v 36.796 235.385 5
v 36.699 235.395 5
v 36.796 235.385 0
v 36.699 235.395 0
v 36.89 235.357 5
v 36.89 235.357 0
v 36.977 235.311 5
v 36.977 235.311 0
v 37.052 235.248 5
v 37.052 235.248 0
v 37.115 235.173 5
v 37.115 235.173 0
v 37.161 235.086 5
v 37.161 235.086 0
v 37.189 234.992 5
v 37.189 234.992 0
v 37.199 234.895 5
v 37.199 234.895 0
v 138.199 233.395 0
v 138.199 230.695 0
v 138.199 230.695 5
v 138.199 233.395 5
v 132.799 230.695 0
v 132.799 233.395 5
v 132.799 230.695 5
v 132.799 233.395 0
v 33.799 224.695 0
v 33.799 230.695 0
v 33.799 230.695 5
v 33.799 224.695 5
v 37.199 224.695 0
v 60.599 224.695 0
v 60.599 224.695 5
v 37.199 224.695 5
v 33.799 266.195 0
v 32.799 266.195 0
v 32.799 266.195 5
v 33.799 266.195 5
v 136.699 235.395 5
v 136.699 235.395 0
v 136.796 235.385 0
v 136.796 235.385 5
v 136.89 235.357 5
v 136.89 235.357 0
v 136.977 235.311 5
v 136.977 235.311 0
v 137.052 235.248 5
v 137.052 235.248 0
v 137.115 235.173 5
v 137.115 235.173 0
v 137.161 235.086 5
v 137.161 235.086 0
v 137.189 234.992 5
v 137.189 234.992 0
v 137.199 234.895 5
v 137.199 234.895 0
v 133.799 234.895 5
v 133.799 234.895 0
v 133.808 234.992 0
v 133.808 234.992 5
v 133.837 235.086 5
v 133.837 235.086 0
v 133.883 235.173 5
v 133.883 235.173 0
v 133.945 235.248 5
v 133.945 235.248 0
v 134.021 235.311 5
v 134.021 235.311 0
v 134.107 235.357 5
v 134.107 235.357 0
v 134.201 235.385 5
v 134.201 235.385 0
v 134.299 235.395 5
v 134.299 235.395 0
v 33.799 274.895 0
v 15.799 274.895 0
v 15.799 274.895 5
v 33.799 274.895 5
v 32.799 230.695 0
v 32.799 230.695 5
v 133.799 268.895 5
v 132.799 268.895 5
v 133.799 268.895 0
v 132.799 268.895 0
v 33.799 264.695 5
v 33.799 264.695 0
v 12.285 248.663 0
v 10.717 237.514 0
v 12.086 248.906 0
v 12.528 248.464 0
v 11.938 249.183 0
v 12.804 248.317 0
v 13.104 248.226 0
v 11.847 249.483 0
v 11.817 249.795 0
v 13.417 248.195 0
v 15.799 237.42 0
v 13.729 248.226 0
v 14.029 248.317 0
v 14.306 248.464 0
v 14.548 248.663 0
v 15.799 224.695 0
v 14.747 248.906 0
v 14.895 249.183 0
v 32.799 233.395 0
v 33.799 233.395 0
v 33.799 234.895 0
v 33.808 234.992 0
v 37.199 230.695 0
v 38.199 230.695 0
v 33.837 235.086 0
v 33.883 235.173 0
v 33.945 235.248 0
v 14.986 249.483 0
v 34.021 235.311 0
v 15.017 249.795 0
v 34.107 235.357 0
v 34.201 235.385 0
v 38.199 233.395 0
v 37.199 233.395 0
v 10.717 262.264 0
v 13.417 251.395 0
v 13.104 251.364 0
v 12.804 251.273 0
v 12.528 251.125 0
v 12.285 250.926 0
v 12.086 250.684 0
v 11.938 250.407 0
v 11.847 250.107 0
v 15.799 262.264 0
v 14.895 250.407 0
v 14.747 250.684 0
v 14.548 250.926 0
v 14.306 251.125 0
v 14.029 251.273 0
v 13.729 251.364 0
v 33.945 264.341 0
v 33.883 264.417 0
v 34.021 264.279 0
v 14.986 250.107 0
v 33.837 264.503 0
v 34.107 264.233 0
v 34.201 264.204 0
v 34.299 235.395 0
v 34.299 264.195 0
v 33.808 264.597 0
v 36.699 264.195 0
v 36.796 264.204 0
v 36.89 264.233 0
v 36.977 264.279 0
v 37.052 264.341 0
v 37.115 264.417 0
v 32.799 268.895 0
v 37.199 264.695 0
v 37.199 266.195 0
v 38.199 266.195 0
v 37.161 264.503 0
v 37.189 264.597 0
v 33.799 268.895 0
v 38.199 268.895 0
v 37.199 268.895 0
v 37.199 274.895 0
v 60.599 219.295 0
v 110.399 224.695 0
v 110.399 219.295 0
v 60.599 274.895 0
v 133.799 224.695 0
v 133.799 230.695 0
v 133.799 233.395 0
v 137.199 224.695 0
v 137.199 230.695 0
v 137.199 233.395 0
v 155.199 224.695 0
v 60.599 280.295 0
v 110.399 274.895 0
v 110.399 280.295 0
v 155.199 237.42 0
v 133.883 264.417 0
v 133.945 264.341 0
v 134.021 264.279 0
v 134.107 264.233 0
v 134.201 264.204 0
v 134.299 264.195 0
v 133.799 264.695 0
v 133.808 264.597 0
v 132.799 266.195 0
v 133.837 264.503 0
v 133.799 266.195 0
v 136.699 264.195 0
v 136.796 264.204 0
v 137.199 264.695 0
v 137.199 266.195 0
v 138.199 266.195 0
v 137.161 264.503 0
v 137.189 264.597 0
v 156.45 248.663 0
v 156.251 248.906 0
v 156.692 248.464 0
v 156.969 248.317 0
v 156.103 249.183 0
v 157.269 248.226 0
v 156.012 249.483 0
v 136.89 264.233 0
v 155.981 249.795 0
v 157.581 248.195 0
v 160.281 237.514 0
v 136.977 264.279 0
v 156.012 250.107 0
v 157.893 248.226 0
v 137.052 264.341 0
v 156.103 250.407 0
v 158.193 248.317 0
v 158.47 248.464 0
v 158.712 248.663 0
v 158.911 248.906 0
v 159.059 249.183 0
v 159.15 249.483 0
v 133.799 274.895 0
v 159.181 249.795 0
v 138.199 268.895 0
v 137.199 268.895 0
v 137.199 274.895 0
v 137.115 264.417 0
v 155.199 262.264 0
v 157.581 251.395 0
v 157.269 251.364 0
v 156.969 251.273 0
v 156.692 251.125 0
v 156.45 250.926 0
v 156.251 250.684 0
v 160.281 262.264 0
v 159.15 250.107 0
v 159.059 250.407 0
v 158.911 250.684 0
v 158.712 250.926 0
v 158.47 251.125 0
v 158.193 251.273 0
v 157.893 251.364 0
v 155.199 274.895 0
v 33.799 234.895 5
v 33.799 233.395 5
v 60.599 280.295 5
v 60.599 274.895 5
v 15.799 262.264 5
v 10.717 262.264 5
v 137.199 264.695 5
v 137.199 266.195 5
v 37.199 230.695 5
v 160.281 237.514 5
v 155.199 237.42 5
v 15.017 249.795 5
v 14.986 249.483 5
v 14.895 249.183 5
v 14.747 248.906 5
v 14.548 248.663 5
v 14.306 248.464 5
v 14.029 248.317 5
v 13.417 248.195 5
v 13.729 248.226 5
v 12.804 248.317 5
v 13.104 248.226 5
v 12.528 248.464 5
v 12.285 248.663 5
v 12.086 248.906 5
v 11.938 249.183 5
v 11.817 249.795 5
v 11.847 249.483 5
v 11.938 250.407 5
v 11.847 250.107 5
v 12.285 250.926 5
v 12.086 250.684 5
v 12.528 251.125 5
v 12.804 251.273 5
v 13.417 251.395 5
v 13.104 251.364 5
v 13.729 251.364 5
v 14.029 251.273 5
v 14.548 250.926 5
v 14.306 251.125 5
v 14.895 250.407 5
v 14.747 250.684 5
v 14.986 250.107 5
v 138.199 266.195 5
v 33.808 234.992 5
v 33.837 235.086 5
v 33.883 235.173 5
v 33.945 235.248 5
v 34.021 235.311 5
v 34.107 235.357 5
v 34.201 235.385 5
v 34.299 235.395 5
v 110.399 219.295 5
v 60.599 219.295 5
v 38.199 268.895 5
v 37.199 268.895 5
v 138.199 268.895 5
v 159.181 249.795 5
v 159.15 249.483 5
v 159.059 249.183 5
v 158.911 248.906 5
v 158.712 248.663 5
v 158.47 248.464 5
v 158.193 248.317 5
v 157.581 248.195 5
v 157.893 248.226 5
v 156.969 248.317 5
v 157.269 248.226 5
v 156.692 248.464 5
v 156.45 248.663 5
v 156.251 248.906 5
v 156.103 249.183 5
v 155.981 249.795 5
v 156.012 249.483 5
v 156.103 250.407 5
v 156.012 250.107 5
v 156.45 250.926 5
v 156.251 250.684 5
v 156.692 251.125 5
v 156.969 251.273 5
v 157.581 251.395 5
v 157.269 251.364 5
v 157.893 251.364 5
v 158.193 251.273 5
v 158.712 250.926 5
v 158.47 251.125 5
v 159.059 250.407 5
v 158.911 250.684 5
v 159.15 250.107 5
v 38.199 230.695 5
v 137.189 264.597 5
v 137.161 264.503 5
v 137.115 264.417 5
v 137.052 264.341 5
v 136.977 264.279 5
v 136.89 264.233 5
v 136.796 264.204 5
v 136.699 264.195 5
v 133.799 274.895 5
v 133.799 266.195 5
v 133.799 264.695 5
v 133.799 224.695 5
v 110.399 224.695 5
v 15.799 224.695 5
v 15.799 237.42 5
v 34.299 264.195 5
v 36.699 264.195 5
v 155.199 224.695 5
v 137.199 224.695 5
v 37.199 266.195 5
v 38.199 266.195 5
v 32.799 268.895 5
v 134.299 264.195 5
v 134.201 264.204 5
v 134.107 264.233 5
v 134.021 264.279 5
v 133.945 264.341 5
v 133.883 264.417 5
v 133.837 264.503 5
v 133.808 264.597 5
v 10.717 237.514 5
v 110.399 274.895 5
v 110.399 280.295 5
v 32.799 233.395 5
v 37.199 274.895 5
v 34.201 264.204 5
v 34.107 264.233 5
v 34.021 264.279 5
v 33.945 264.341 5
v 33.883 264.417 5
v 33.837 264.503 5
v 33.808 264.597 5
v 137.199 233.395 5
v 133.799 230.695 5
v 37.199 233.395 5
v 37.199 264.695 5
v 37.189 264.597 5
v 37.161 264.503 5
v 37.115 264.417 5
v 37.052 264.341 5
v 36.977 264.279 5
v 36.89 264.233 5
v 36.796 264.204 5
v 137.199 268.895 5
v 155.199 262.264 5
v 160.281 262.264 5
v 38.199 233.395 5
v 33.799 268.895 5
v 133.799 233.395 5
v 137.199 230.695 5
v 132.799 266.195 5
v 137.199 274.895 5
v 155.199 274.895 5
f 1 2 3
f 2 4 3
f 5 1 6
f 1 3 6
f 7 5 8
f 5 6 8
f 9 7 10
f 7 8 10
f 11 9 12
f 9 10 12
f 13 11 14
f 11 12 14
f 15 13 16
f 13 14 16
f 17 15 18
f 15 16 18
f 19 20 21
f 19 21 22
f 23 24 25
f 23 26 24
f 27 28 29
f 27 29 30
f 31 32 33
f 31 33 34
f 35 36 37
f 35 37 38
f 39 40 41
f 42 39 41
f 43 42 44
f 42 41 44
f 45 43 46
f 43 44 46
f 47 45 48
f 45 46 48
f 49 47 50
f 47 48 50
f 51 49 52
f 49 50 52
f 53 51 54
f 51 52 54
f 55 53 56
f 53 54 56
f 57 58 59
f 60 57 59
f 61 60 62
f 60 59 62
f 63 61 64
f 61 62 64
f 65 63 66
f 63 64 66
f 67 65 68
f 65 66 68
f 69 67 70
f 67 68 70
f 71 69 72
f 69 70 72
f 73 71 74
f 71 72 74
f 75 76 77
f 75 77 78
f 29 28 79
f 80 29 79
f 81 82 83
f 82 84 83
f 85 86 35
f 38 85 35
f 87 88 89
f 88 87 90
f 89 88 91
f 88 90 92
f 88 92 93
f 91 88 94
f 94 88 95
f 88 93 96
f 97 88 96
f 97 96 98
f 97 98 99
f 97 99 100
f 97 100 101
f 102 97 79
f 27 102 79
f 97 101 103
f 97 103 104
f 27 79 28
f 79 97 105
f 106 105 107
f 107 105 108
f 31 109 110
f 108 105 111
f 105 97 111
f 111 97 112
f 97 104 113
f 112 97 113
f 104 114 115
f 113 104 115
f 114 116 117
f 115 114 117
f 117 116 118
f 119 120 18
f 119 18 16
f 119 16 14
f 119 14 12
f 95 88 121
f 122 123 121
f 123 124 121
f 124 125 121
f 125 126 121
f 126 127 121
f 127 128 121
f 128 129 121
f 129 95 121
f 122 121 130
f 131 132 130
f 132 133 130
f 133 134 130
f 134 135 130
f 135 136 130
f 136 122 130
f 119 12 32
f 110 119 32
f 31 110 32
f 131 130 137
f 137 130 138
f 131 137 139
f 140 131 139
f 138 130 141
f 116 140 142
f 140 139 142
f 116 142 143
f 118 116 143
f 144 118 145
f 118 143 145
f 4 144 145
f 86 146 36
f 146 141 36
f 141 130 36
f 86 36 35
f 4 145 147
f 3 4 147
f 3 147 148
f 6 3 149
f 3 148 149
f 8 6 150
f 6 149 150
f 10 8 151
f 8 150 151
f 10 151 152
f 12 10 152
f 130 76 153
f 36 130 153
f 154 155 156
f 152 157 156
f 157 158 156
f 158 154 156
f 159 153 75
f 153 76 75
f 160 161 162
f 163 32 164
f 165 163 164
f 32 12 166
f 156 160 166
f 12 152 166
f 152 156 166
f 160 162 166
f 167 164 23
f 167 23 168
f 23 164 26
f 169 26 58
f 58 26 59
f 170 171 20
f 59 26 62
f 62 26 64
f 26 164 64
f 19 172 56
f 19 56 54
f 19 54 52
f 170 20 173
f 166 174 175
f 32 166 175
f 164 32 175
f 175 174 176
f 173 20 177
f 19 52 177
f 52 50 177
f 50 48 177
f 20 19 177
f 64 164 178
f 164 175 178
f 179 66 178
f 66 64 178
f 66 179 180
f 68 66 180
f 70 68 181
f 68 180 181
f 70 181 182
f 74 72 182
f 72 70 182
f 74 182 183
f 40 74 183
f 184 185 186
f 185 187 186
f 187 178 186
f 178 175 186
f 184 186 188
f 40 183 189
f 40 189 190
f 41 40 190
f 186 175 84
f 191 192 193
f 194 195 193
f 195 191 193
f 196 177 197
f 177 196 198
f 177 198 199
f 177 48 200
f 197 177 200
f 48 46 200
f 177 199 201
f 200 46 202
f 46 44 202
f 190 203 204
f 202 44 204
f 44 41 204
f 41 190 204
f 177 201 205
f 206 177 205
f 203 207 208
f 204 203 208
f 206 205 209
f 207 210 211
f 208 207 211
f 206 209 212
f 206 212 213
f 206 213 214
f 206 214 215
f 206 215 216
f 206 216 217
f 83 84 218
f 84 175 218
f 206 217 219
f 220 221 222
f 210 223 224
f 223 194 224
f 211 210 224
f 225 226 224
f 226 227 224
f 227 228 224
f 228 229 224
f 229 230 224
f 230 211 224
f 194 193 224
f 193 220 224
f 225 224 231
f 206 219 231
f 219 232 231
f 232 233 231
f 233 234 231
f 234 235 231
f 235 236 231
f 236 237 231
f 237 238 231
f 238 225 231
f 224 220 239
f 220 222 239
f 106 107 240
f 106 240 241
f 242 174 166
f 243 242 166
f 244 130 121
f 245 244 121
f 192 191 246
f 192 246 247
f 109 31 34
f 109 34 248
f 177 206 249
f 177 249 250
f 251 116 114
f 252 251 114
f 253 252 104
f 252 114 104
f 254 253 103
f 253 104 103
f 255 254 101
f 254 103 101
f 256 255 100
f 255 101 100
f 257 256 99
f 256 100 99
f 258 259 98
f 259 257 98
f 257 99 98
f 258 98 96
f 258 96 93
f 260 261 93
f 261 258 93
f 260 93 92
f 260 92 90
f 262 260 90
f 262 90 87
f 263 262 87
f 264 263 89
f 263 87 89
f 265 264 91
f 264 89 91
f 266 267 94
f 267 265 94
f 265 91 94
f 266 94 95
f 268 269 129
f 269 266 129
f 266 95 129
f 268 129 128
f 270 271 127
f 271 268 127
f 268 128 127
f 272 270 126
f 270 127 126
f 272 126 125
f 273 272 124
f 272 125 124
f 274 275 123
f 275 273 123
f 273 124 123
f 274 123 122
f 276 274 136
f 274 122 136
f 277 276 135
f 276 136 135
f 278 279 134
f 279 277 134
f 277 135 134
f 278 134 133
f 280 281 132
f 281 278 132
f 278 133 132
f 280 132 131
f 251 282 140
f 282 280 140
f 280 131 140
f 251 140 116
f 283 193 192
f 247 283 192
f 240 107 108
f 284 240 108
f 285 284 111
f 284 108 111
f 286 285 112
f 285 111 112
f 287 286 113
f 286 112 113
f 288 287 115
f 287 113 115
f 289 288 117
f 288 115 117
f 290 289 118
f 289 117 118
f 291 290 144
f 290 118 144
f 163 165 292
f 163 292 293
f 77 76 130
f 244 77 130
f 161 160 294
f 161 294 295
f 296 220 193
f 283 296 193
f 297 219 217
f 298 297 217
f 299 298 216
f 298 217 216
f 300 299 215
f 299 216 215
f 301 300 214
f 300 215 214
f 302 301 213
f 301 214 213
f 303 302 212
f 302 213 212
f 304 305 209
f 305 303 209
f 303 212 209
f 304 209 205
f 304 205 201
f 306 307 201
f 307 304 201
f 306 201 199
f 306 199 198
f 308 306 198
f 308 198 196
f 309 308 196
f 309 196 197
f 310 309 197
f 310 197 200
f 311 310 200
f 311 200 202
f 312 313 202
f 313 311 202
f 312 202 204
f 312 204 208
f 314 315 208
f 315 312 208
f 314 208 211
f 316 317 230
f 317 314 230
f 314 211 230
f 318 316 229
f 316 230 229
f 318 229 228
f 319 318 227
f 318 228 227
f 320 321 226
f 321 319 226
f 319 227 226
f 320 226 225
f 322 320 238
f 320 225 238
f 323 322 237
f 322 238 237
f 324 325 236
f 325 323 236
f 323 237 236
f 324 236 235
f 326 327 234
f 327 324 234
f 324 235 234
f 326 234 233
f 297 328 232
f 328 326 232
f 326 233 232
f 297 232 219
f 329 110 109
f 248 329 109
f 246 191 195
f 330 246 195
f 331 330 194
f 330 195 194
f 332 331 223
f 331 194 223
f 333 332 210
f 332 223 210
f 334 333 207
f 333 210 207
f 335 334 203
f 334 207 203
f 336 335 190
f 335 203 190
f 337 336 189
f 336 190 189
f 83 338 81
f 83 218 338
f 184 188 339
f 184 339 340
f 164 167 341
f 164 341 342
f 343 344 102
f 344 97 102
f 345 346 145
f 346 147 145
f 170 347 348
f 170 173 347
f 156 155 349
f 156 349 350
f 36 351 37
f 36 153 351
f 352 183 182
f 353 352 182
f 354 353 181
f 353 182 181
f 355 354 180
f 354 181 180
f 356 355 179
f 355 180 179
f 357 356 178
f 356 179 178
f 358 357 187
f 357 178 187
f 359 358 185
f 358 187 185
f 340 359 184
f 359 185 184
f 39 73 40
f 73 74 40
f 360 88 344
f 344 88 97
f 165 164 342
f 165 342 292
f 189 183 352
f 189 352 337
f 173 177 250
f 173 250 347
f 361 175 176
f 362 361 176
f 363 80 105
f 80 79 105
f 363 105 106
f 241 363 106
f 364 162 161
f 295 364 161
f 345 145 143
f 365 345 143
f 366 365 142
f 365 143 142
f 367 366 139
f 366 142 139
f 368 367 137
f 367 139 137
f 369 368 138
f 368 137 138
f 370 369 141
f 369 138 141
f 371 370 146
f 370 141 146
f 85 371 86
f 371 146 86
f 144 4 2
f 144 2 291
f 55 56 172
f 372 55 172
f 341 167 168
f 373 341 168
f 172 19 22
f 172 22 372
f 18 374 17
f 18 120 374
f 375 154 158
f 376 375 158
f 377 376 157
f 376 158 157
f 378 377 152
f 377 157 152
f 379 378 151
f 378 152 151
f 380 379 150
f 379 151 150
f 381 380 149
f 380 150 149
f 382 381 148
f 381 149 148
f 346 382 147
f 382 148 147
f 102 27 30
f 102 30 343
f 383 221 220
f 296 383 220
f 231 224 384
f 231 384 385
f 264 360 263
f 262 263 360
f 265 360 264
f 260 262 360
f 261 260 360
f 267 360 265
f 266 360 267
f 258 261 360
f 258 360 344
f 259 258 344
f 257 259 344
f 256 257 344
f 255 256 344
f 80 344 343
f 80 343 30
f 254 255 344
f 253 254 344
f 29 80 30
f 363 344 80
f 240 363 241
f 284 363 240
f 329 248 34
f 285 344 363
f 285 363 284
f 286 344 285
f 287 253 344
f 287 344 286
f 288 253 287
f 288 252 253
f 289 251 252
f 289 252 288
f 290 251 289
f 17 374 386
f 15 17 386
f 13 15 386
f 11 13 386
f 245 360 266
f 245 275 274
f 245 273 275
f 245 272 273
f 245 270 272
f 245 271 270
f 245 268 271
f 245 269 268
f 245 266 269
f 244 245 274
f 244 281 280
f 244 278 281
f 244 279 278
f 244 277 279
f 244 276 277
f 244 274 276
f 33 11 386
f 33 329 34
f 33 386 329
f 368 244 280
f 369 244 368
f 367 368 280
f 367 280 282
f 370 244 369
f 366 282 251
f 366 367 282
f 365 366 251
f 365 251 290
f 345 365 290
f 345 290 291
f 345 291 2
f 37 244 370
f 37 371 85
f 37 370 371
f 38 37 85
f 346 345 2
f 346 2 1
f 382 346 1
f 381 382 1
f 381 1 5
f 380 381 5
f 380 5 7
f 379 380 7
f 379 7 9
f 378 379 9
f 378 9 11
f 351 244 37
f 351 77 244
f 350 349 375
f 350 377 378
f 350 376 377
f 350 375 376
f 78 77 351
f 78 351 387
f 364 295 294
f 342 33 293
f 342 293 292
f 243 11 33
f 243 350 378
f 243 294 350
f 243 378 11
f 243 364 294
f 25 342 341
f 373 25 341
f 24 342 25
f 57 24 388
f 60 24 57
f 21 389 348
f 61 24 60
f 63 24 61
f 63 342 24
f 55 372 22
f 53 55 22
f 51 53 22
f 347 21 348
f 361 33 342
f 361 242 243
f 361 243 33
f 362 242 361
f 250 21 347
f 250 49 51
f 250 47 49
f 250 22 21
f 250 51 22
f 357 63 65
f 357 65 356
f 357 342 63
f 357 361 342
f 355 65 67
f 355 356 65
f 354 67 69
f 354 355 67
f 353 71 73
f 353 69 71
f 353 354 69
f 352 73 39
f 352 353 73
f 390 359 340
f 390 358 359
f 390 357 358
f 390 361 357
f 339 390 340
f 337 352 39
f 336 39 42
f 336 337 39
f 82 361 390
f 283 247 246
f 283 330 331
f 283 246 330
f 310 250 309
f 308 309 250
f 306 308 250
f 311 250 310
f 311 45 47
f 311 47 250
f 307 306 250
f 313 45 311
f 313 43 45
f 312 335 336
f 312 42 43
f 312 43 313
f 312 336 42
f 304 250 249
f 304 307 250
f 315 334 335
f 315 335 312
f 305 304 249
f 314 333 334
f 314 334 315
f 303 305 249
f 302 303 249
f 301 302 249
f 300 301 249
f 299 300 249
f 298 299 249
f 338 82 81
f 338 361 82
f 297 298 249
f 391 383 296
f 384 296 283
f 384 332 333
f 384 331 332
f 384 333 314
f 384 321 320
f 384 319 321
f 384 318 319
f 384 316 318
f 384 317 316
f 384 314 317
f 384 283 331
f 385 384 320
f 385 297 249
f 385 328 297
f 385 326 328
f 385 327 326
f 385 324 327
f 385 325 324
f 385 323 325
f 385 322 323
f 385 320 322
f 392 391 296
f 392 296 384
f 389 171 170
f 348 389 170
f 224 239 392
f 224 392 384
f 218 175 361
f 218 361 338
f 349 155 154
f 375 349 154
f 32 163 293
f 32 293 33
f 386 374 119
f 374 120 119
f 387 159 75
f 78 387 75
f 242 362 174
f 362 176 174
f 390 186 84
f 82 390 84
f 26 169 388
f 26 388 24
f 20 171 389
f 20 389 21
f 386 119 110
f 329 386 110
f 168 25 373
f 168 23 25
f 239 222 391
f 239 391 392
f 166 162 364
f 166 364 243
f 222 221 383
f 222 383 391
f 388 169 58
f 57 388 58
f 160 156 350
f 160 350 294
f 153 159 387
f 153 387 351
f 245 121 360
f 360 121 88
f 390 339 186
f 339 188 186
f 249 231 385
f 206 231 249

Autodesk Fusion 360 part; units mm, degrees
sketch "Esquisse1" plane through (0, 0, 0) normal (0, 0, 1) x (1, 0, 0)
  line L0 (15.7988, 249.7948) -> (43.7076, 249.7948) construction
  line L1 (15.7988, 262.2639) -> (10.7166, 262.2639)
  line L2 (10.7166, 262.2639) -> (10.7166, 237.5139)
  line L3 (10.7166, 237.5139) -> (15.7988, 237.4198)
  line L4 (15.7988, 274.8948) -> (15.7988, 262.2639)
  line L5 (15.7988, 237.4198) -> (15.7988, 224.6948)
  line L6 (110.3988, 274.8948) -> (110.3988, 280.2948)
  line L7 (110.3988, 280.2948) -> (60.5988, 280.2948)
  line L8 (60.5988, 280.2948) -> (60.5988, 274.8948)
  line L9 (15.7988, 274.8948) -> (60.5988, 274.8948)
  line L10 (110.3988, 274.8948) -> (155.1988, 274.8948)
  line L11 (110.3988, 224.6948) -> (110.3988, 219.2948)
  line L12 (110.3988, 219.2948) -> (60.5988, 219.2948)
  line L13 (60.5988, 219.2948) -> (60.5988, 224.6948)
  line L14 (155.1988, 224.6948) -> (110.3988, 224.6948)
  line L15 (60.5988, 224.6948) -> (15.7988, 224.6948)
  line L16 (85.4988, 283.8421) -> (85.4988, 207.6137) construction
  line L17 (155.1988, 262.2639) -> (160.281, 262.2639)
  line L18 (160.281, 262.2639) -> (160.281, 237.5139)
  line L19 (160.281, 237.5139) -> (155.1988, 237.4198)
  line L20 (155.1988, 274.8948) -> (155.1988, 262.2639)
  line L21 (155.1988, 237.4198) -> (155.1988, 224.6948)
  circle A0 centre (13.4166, 249.7948) radius 1.6
  circle A1 centre (157.581, 249.7948) radius 1.6
  line L22 (33.7988, 274.8948) -> (37.1988, 274.8948)
  line L23 (37.1988, 274.8948) -> (37.1988, 268.8948)
  line L24 (33.7988, 268.8948) -> (33.7988, 274.8948)
  line L25 (35.4988, 277) -> (35.4988, 258) construction
  line L26 (32.7988, 268.8948) -> (32.7988, 266.1948)
  line L27 (38.1988, 266.1948) -> (38.1988, 268.8948)
  line L28 (37.1988, 266.1948) -> (37.1988, 264.6948)
  line L29 (36.6988, 264.1948) -> (34.2988, 264.1948)
  line L30 (33.7988, 264.6948) -> (33.7988, 266.1948)
  arc A2 (33.7988, 264.6948) -> (34.2988, 264.1948) centre (34.2988, 264.6948) ccw
  arc A3 (36.6988, 264.1948) -> (37.1988, 264.6948) centre (36.6988, 264.6948) ccw
  line L31 (32.7988, 266.1948) -> (33.7988, 266.1948)
  line L32 (37.1988, 266.1948) -> (38.1988, 266.1948)
  line L33 (38.1988, 268.8948) -> (37.1988, 268.8948)
  line L34 (33.7988, 268.8948) -> (32.7988, 268.8948)
  line L35 (33.7988, 234.8948) -> (33.7988, 233.3948)
  line L36 (37.1988, 233.3948) -> (38.1988, 233.3948)
  line L37 (38.1988, 233.3948) -> (38.1988, 230.6948)
  arc A4 (34.2988, 235.3948) -> (33.7988, 234.8948) centre (34.2988, 234.8948) ccw
  line L38 (32.7988, 230.6948) -> (32.7988, 233.3948)
  arc A5 (37.1988, 234.8948) -> (36.6988, 235.3948) centre (36.6988, 234.8948) ccw
  line L39 (36.6988, 235.3948) -> (34.2988, 235.3948)
  line L40 (37.1988, 233.3948) -> (37.1988, 234.8948)
  line L41 (32.7988, 233.3948) -> (33.7988, 233.3948)
  line L42 (33.7988, 230.6948) -> (32.7988, 230.6948)
  line L43 (38.1988, 230.6948) -> (37.1988, 230.6948)
  line L44 (33.7988, 230.6948) -> (33.7988, 224.6948)
  line L45 (37.1988, 224.6948) -> (37.1988, 230.6948)
  line L46 (138.1988, 268.8948) -> (138.1988, 266.1948)
  line L47 (137.1988, 230.6948) -> (138.1988, 230.6948)
  line L48 (133.7988, 233.3948) -> (133.7988, 234.8948)
  line L49 (132.7988, 268.8948) -> (133.7988, 268.8948)
  line L50 (138.1988, 233.3948) -> (137.1988, 233.3948)
  line L51 (132.7988, 266.1948) -> (132.7988, 268.8948)
  line L52 (133.7988, 266.1948) -> (133.7988, 264.6948)
  line L53 (133.7988, 266.1948) -> (132.7988, 266.1948)
  line L54 (132.7988, 233.3948) -> (132.7988, 230.6948)
  line L55 (137.1988, 268.8948) -> (138.1988, 268.8948)
  line L56 (137.1988, 234.8948) -> (137.1988, 233.3948)
  line L57 (138.1988, 230.6948) -> (138.1988, 233.3948)
  line L58 (134.2988, 264.1948) -> (136.6988, 264.1948)
  arc A6 (134.2988, 235.3948) -> (133.7988, 234.8948) centre (134.2988, 234.8948) ccw
  arc A7 (137.1988, 234.8948) -> (136.6988, 235.3948) centre (136.6988, 234.8948) ccw
  line L59 (132.7988, 230.6948) -> (133.7988, 230.6948)
  line L60 (138.1988, 266.1948) -> (137.1988, 266.1948)
  line L61 (137.1988, 264.6948) -> (137.1988, 266.1948)
  arc A8 (136.6988, 264.1948) -> (137.1988, 264.6948) centre (136.6988, 264.6948) ccw
  line L62 (134.2988, 235.3948) -> (136.6988, 235.3948)
  arc A9 (133.7988, 264.6948) -> (134.2988, 264.1948) centre (134.2988, 264.6948) ccw
  line L63 (133.7988, 233.3948) -> (132.7988, 233.3948)
  line L64 (137.1988, 230.6948) -> (137.1988, 224.6948)
  line L65 (133.7988, 224.6948) -> (133.7988, 230.6948)
  line L66 (137.1988, 268.8948) -> (137.1988, 274.8948)
  line L67 (133.7988, 274.8948) -> (133.7988, 268.8948)
  point P0 (155.1988, 249.7948)
  point P1 (33.7988, 264.1948)
  point P2 (33.7988, 235.3948)
  point P3 (127.2901, 249.7948)
  point P4 (137.1988, 235.3948)
  point P5 (135.4988, 258)
  point P6 (137.1988, 264.1948)
  dimension "d99" = 139.4
  dimension "d100" = 49.8
  dimension "d101" = 44.8
  dimension "d102" = 5.4
  dimension "d103" = 69.7
  dimension "d104" = 24.75
  dimension "d105" = 50.2
  dimension "d106" = 12.725
  dimension "d107" = 3.2
  dimension "d109" = 2.7
  dimension "d110" = 6
  dimension "d111" = 3.4
  dimension "d113" = 1.7
  dimension "d114" = 5.4
  dimension "d115" = 2.7
  dimension "d116" = 2.7
  dimension "d117" = 3.4
  dimension "d118" = 1.7
  dimension "d119" = 2
  dimension "d120" = 0.5
  dimension "d121" = 25.1
extrude "Extrusion1" add sketch "Esquisse1" along normal blind 5 contours L1 L2 L3 L4 L5 L6 L7 L8 L9 L10 L11 L12 L13 L14 L15 L17 L18 L19 L20 L21 L23 L24 L26 L27 L28 L29 L30 A2 A3 L31 L32 L33 L34 L35 L36 L37 A4 L38 A5 L39 L40 L41 L42 L43 L44 L45 L46 L47 L48 L49 L50 L51 L52 L53 L54 L55 L56 L57 L58 A6 A7 L59 L60 L61 A8 L62 A9 L63 L64 L65 L66 L67
equation "d84 = 5.3 mm + 0.1 mm"
equation "d87 = 36 mm - 0.2 mm"
equation "d88 = 36 mm + 0.1 mm"
equation "d101 = ( d99 - d100 ) / 2"
equation "d103 = d99 / 2"
equation "d106 = ( d105 - d104 ) / 2"
equation "d109 = d102 / 2"
equation "d113 = d111 / 2"
equation "d116 = d114 / 2"
equation "d117 = d111"
equation "d118 = d117 / 2"
